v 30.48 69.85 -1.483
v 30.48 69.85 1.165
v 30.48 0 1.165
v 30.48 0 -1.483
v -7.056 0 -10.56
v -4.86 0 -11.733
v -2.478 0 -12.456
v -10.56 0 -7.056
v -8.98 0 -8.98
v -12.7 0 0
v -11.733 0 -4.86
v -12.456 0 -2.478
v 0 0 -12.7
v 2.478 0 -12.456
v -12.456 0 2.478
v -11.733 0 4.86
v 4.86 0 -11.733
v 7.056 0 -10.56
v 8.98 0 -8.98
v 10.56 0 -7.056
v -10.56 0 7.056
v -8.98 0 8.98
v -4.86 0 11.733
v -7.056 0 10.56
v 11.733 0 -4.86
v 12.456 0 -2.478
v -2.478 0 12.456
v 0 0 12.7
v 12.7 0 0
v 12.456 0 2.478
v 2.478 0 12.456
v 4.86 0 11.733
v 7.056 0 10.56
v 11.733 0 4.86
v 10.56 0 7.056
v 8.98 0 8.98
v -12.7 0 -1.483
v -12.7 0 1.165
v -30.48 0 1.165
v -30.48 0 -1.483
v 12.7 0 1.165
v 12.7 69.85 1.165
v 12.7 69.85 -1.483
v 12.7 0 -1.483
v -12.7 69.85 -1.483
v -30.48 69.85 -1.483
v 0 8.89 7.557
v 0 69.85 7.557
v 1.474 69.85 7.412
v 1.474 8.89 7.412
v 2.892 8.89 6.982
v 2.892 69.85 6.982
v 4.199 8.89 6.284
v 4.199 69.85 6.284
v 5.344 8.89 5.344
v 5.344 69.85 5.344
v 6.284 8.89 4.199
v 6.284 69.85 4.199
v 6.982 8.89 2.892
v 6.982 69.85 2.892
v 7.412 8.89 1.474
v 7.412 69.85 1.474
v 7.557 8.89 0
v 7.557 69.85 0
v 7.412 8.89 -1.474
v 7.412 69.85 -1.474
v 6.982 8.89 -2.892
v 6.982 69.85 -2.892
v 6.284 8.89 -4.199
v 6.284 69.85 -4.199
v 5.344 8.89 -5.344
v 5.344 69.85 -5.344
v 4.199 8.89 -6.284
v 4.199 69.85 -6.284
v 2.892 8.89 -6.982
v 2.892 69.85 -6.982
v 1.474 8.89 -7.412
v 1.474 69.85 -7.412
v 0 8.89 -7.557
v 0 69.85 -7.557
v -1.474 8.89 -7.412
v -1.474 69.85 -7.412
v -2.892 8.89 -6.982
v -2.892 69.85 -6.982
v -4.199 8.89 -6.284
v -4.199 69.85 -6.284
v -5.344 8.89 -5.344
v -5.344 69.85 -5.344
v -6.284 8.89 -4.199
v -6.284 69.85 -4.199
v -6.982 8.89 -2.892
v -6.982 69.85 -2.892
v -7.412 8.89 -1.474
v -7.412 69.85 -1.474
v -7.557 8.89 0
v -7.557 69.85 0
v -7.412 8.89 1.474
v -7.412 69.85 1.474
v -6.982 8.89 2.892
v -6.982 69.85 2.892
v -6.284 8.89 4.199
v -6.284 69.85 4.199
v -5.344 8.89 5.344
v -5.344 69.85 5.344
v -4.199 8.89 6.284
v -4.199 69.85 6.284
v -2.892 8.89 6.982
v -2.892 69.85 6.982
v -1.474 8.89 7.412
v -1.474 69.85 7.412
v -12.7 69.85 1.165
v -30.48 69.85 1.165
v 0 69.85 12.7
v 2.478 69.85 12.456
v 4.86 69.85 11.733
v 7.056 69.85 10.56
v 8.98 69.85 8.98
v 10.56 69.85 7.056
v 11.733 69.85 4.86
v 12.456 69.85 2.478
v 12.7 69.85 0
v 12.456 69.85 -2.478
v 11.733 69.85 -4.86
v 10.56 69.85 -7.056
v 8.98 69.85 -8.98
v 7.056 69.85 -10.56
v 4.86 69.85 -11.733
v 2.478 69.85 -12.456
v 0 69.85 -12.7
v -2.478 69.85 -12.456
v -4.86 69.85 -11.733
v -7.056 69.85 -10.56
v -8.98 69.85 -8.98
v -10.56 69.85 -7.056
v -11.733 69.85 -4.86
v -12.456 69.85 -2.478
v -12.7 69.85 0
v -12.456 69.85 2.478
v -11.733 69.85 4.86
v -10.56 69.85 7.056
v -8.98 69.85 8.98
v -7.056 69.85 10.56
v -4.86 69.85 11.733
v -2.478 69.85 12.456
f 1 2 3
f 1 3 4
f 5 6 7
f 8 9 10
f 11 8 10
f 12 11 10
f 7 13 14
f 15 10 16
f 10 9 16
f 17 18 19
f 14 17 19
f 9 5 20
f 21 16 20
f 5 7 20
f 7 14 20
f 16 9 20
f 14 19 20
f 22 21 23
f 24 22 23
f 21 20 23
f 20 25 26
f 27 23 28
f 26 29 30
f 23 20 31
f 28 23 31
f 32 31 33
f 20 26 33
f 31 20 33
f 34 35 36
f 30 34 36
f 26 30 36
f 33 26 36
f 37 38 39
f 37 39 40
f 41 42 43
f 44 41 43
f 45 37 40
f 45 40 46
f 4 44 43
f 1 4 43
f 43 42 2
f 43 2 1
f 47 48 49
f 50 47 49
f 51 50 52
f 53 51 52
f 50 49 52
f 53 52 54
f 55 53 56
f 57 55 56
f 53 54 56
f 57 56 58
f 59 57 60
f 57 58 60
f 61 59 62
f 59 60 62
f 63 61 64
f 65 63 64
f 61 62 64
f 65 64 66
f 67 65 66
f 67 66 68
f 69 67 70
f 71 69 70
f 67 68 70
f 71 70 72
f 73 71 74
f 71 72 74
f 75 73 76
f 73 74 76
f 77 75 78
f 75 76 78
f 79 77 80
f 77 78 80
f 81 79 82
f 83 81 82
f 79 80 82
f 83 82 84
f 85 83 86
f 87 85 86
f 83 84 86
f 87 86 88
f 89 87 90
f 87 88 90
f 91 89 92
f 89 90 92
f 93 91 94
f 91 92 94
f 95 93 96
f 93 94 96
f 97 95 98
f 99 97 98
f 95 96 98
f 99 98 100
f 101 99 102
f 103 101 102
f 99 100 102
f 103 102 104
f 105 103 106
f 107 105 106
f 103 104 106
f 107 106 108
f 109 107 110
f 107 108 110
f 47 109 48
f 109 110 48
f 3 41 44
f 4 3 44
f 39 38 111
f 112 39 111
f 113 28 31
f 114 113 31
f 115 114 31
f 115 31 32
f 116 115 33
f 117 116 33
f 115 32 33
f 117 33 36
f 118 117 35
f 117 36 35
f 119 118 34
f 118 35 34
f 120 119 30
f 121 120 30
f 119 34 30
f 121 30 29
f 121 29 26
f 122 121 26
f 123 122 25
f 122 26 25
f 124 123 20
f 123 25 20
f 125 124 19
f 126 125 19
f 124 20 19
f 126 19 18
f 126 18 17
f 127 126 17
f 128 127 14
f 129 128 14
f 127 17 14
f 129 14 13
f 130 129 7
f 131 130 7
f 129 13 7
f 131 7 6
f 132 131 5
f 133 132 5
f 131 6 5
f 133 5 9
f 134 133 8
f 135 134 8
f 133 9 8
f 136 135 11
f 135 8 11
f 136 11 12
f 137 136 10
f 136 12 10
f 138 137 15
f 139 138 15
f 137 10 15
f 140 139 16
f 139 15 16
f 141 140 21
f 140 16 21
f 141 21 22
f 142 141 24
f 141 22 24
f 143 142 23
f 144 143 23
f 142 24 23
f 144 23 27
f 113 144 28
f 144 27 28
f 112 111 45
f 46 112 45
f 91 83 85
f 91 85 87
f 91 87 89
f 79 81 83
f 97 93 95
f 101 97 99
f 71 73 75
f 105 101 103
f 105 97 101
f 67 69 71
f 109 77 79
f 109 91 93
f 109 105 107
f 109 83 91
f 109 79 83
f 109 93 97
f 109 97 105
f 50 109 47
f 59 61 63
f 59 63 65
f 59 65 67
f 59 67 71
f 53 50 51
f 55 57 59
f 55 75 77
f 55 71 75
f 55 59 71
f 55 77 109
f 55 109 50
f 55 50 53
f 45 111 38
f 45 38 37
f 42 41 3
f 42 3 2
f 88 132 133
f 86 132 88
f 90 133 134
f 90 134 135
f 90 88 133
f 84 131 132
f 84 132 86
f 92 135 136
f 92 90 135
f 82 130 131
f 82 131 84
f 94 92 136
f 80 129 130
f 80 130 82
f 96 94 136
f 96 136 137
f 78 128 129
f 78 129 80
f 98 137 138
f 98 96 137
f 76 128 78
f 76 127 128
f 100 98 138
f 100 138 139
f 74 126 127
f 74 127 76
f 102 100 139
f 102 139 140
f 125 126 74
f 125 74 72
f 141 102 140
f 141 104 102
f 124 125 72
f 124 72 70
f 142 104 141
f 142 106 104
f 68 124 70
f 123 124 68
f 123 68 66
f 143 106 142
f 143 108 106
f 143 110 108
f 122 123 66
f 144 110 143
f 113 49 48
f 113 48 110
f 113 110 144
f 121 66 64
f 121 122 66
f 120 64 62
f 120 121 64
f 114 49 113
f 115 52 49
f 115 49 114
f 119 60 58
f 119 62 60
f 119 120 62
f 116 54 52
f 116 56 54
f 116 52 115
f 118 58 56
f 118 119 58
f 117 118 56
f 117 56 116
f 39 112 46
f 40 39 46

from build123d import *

# Parameters (mm, degrees)
SKETCH2_R           = 12.7
BOSS_EXTRUDE1_DEPTH = 69.85
SKETCH5_R           = 7.557373004
CUT_EXTRUDE1_DEPTH  = 60.96
SKETCH7_W           = 2.647893452
SKETCH7_H           = 69.85
BOSS_EXTRUDE2_DEPTH = 17.78


with BuildPart() as part:
    # Sketch2 → Boss-Extrude1 (new body)
    with BuildSketch(Plane(origin=(0, 0, 0), x_dir=(1, 0, 0), z_dir=(0, 1, 0))):
        with Locations(Location((0, 0, 0), (0, 0, 270))):
            Circle(SKETCH2_R)
    extrude(amount=BOSS_EXTRUDE1_DEPTH)

    # Sketch5 → Cut-Extrude1 (cut)
    with BuildSketch(Plane(origin=(0, 69.85, 0), x_dir=(1, 0, 0), z_dir=(0, 1, 0))):
        with Locations(Location((0, 0, 0), (0, 0, 270))):
            Circle(SKETCH5_R)
    extrude(amount=-CUT_EXTRUDE1_DEPTH, mode=Mode.SUBTRACT)


with BuildPart() as body_2:
    # Sketch7 → Boss-Extrude2 (new body)
    with BuildSketch(Plane(origin=(12.7, 0, 0), x_dir=(0, 0, -1), z_dir=(1, 0, 0))):
        with Locations((0.158873607, 34.925)):
            Rectangle(SKETCH7_W, SKETCH7_H)
    extrude(amount=BOSS_EXTRUDE2_DEPTH)


with BuildPart() as body_3:
    # Mirror3: mirrored copy
    add(body_2.part.mirror(Plane(origin=(0, 0, 0), x_dir=(0, 0, 1), z_dir=(1, 0, 0))))


solid = Compound([part.part, body_2.part, body_3.part])
